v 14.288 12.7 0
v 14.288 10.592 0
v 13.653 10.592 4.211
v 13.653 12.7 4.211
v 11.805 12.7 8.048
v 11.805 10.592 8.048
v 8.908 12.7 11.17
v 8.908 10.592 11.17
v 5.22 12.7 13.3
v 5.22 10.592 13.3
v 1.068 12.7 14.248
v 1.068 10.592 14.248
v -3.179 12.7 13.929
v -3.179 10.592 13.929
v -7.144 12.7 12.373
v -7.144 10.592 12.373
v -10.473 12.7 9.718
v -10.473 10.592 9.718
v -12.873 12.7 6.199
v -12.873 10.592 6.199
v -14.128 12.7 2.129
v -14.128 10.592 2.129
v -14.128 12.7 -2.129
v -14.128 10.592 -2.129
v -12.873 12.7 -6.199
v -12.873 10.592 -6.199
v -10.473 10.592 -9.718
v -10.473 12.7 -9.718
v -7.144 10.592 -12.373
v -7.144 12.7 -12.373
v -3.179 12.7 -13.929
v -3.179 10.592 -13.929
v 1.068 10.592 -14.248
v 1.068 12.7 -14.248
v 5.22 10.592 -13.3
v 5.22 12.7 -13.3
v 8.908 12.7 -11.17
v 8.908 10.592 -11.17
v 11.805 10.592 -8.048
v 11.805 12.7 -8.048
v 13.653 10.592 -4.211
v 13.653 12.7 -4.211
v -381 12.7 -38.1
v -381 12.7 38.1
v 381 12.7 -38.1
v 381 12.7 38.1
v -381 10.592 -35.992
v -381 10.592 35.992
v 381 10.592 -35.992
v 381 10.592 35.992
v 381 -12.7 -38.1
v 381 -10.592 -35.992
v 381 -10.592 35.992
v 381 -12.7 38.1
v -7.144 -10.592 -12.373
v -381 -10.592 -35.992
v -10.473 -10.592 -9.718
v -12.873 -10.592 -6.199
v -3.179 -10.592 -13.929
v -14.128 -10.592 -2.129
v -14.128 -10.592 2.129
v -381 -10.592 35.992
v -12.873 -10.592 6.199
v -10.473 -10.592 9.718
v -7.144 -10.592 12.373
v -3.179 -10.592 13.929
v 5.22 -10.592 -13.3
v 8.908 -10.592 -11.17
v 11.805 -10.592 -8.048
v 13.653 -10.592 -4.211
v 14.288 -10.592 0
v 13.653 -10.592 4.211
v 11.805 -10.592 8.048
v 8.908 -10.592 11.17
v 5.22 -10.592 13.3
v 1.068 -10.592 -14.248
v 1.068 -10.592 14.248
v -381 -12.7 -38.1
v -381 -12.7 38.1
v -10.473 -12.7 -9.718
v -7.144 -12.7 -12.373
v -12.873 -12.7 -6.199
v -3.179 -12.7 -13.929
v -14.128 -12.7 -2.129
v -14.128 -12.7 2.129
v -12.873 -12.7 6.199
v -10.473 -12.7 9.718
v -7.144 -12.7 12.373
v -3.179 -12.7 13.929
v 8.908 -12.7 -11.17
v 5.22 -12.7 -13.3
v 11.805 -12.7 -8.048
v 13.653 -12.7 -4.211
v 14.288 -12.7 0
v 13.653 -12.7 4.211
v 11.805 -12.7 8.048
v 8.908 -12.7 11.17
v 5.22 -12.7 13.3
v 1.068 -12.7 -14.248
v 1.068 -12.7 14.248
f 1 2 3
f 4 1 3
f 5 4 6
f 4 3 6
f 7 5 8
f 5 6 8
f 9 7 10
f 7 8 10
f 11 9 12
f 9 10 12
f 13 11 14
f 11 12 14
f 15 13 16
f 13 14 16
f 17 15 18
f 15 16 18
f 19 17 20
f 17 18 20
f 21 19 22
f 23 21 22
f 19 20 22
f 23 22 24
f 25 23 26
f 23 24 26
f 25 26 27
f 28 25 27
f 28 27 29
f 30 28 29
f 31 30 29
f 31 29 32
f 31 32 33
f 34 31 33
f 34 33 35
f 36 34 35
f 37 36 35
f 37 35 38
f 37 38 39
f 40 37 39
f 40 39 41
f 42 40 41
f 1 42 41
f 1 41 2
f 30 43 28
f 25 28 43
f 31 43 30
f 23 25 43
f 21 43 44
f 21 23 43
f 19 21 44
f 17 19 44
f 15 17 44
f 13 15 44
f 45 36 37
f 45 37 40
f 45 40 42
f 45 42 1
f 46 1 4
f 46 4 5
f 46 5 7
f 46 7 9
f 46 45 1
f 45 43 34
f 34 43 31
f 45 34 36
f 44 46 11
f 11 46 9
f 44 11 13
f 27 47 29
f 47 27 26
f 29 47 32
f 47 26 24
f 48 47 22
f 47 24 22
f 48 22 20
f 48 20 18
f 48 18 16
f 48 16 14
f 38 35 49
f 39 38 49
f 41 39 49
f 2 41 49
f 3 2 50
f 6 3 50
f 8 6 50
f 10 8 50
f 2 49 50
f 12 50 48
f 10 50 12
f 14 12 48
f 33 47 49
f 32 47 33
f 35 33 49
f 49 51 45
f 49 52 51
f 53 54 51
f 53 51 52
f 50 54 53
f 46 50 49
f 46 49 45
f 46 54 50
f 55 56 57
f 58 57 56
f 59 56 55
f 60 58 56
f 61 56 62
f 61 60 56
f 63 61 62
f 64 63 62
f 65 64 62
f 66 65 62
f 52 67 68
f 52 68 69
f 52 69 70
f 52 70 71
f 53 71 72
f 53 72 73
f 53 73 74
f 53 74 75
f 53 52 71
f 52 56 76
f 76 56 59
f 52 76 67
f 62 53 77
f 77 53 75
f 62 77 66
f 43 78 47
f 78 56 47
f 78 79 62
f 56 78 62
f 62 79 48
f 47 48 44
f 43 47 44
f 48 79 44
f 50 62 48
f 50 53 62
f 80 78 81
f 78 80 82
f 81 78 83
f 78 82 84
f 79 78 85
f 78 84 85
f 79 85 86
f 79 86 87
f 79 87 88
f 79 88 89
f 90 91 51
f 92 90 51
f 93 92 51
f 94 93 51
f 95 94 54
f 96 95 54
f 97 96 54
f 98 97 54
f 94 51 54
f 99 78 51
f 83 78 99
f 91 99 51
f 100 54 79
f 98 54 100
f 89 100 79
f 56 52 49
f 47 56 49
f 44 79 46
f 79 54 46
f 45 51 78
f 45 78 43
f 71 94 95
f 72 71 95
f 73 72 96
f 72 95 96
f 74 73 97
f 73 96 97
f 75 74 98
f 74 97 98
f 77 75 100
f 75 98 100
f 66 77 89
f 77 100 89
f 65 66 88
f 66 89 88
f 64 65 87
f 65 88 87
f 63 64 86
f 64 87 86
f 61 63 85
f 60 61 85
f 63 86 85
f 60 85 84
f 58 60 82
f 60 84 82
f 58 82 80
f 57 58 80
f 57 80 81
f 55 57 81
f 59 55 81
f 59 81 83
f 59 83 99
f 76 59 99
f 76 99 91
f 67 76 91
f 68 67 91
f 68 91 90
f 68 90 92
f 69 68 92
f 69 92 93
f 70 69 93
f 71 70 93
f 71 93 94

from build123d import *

# Parameters (mm, degrees)
F0_W     = 25.4
F0_H     = 76.2
F0_W_2   = 21.1836
F0_H_2   = 71.9836
F1_DEPTH = 381
F2_R     = 14.2875
F3_DEPTH = 25.401


with BuildPart() as f1:
    # F0 (on Right) → F1 (new body, symmetric)
    with BuildSketch(Plane.YZ):
        Rectangle(F0_W, F0_H)
        Rectangle(F0_W_2, F0_H_2, mode=Mode.SUBTRACT)
    extrude(amount=F1_DEPTH, both=True)

    # F2 (on face) → F3 (cut, through all)
    with BuildSketch(Plane.XZ.offset(12.7)):
        Circle(F2_R)
    extrude(amount=-F3_DEPTH, mode=Mode.SUBTRACT)


solid = f1.part
